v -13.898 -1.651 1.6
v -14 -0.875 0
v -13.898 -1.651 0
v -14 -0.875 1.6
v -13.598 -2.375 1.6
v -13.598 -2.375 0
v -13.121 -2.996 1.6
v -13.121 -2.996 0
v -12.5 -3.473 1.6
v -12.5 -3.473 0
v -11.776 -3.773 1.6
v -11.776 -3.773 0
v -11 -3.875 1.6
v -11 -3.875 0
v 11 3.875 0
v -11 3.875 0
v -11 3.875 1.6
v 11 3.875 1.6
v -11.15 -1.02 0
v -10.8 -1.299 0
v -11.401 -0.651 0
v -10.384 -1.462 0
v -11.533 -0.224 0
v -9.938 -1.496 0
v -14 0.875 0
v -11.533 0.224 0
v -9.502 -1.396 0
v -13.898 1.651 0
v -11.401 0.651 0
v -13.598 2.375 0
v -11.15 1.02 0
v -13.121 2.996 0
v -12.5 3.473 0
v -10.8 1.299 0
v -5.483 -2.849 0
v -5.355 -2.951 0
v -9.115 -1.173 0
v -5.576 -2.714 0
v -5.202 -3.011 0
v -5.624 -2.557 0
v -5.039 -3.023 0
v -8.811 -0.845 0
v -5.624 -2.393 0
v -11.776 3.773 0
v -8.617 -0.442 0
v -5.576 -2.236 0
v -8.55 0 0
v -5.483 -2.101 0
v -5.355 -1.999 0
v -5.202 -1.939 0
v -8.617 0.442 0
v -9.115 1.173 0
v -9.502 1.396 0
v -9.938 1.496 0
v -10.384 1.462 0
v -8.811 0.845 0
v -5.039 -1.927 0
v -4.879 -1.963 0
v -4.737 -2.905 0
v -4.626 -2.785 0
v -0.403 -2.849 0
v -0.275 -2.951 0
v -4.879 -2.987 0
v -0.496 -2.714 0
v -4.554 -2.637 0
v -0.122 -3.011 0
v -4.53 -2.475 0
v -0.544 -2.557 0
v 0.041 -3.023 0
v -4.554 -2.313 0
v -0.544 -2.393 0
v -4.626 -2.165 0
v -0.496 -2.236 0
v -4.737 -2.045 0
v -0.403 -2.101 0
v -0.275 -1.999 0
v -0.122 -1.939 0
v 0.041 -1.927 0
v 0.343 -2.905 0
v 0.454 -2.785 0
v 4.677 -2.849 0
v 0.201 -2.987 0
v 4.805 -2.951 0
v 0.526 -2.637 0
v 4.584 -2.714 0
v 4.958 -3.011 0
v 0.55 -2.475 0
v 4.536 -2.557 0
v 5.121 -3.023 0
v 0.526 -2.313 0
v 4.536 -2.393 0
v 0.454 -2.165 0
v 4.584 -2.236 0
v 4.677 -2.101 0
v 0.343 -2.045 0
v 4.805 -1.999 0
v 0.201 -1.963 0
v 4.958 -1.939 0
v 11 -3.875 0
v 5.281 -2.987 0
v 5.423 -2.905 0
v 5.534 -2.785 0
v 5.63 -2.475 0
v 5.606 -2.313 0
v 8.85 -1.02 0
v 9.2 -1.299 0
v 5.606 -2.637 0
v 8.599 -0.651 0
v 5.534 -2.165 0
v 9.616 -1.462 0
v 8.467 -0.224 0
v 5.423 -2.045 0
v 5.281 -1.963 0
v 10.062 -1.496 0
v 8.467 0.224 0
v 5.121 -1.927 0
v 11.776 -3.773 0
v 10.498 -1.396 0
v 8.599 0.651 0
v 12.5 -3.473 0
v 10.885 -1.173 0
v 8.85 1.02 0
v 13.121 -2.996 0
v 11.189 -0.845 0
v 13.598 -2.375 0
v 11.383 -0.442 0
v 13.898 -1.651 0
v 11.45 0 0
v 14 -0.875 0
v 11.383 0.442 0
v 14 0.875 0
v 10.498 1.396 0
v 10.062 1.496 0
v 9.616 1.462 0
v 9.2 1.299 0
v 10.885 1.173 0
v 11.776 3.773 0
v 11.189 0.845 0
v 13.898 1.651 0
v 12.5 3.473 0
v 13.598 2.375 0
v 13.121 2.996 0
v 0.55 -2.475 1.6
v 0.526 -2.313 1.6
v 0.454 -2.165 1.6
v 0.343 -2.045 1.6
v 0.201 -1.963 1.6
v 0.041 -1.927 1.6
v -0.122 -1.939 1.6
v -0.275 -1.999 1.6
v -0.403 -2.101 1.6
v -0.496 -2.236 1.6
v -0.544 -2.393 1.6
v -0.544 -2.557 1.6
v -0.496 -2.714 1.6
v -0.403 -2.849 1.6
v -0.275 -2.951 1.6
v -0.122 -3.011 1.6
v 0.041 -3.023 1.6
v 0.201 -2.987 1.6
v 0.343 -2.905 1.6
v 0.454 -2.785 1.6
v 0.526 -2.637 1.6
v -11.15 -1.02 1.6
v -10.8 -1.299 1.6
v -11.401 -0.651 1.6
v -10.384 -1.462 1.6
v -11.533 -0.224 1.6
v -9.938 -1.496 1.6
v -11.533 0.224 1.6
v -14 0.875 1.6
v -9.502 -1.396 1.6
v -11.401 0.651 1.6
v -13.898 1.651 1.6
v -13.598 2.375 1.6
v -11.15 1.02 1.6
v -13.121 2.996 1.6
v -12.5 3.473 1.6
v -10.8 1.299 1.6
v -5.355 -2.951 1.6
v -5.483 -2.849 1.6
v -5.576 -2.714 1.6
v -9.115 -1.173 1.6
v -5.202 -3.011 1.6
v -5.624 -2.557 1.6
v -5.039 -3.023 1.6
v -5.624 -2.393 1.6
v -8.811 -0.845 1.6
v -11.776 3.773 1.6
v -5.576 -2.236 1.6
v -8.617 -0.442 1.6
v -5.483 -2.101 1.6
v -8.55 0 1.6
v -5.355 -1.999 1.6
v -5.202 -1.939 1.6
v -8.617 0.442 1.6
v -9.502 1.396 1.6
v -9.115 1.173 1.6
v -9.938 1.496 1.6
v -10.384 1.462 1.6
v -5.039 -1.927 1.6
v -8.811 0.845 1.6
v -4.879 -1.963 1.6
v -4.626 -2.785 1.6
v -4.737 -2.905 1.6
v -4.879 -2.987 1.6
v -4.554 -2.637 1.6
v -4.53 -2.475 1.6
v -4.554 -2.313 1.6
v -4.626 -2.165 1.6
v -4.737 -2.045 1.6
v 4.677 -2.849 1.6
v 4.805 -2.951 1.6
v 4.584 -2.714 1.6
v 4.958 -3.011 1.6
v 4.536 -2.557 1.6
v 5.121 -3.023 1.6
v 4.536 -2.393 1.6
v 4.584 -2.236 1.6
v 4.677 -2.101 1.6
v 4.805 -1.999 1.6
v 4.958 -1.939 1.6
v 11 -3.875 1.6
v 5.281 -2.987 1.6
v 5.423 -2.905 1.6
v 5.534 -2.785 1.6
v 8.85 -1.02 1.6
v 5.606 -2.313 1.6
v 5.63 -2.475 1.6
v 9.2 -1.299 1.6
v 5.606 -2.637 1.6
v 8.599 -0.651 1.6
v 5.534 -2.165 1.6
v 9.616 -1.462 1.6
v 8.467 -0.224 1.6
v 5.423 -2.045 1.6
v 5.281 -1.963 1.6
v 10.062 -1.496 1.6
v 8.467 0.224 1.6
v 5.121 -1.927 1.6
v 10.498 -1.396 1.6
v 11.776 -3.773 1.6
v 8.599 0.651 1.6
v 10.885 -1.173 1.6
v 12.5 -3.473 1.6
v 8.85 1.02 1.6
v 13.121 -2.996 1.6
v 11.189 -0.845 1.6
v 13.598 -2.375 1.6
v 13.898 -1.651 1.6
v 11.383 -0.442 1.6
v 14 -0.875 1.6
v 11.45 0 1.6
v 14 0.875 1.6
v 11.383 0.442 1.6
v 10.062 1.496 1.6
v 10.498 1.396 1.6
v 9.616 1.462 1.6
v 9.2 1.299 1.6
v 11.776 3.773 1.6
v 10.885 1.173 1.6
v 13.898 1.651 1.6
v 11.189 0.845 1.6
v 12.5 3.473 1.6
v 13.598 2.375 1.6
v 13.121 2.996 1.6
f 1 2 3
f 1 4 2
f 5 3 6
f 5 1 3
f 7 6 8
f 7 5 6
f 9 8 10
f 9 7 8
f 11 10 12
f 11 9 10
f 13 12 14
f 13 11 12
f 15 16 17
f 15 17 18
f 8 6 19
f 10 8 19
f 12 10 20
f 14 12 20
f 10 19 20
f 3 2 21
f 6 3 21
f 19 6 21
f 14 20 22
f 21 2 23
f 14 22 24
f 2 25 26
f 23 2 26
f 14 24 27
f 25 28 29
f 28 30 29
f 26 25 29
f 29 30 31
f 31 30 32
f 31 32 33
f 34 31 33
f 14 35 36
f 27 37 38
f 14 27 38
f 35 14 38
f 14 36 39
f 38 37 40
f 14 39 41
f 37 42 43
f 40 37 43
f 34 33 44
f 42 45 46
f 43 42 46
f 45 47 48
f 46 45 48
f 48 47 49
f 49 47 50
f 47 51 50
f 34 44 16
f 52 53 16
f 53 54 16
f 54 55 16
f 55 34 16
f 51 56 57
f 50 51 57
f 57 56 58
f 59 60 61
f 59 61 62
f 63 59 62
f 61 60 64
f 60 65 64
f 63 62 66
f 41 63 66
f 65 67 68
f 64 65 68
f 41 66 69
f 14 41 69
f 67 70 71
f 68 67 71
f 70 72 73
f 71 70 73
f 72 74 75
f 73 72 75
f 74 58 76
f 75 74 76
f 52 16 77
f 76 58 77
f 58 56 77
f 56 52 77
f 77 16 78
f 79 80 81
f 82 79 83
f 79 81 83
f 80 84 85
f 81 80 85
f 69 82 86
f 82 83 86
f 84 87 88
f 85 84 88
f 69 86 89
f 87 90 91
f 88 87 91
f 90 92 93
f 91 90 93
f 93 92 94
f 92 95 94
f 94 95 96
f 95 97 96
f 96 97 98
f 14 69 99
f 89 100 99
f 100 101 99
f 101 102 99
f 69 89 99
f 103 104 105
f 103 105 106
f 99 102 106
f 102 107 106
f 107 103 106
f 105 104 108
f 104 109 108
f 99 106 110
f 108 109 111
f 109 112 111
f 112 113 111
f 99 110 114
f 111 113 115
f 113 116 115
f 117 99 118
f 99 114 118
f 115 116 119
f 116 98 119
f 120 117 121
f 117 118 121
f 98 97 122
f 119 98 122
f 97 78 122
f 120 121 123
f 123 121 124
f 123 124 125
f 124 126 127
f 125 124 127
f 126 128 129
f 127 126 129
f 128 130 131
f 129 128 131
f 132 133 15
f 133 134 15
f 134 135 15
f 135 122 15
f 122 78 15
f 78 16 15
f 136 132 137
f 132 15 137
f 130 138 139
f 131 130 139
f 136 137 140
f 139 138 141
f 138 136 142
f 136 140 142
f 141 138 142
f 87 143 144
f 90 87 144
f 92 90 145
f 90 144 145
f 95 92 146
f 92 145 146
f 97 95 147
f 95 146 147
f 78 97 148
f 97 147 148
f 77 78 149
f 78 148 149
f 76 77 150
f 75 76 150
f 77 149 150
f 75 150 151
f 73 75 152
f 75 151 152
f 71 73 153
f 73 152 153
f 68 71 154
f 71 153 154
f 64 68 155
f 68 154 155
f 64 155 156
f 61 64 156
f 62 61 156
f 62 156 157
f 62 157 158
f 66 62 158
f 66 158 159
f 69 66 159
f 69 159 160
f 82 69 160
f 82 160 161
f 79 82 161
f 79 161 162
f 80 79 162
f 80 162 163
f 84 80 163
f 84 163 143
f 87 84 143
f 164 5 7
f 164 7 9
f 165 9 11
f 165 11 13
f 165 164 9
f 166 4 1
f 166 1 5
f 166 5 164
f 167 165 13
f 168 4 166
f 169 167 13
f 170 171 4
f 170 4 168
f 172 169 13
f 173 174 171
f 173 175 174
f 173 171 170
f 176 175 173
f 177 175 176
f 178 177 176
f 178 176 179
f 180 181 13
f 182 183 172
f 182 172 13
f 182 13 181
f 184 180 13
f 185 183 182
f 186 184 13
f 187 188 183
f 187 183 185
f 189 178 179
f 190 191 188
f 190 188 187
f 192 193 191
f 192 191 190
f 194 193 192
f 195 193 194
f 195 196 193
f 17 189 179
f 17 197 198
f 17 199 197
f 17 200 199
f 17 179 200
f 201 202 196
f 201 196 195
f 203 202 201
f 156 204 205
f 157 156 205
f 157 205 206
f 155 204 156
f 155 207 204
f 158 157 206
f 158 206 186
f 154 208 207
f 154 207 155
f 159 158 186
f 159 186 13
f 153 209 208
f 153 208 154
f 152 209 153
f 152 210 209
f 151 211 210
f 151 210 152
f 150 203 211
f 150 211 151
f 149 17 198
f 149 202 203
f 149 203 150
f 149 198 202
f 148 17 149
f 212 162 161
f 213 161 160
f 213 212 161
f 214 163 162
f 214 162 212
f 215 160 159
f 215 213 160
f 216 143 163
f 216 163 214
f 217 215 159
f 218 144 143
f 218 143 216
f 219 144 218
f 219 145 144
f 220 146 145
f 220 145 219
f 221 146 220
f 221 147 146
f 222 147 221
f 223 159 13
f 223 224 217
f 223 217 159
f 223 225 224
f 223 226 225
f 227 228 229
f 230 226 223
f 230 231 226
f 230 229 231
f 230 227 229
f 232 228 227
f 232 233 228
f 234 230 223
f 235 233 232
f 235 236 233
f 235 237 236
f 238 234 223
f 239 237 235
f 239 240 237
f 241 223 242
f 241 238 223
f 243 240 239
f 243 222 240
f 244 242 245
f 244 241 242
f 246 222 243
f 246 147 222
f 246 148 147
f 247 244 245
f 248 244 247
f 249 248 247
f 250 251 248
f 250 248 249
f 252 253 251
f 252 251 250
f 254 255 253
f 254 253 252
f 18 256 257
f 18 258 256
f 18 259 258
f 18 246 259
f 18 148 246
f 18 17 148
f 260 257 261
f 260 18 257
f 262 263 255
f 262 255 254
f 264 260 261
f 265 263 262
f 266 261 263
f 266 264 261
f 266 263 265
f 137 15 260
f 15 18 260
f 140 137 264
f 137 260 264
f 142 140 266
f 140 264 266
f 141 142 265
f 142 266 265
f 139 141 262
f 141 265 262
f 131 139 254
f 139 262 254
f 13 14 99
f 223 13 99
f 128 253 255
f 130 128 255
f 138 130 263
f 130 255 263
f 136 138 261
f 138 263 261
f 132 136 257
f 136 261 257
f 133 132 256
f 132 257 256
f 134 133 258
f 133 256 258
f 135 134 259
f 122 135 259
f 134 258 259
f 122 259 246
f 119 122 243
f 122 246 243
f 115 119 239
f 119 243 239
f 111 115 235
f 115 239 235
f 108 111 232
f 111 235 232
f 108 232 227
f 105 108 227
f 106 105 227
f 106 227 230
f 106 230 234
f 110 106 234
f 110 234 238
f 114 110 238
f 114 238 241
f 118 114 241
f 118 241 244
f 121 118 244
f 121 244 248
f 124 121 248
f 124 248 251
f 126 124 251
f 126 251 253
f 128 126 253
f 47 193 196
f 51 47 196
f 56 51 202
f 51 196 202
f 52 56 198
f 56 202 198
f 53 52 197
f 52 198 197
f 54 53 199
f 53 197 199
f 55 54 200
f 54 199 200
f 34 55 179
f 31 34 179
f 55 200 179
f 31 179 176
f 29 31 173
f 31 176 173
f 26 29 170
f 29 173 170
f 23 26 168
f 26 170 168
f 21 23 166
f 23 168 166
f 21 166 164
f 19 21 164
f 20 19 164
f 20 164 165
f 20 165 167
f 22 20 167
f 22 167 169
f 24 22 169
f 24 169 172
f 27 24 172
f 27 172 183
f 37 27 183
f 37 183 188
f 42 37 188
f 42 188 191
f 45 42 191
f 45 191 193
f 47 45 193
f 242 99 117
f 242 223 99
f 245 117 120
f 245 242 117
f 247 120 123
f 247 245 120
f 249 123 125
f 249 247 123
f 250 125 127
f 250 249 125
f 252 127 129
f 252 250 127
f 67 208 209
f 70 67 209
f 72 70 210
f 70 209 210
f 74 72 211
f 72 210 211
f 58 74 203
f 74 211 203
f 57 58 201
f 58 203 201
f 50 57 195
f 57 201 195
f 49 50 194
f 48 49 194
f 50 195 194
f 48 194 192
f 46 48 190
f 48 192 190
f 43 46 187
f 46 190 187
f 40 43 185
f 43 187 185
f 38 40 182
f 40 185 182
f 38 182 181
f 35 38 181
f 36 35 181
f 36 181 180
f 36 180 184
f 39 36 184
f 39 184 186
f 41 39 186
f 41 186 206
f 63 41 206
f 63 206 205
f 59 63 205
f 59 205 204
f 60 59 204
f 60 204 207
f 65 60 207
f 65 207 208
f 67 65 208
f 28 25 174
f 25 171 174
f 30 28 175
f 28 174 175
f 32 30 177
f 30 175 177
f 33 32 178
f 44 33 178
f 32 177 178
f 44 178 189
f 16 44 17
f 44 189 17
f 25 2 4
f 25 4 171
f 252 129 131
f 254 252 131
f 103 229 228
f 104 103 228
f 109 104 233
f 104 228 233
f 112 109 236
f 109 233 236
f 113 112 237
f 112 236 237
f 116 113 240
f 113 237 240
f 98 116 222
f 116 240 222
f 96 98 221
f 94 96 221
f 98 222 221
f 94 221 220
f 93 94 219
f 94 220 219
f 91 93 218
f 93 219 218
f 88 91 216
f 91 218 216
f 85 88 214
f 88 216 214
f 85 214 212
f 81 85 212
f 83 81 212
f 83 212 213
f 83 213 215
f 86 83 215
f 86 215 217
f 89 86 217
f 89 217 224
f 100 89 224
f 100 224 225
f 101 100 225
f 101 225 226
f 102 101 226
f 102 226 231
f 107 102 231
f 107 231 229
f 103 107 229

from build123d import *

# Parameters (mm, degrees)
SKETCH1_W           = 28
SKETCH1_H           = 7.75
BOSS_EXTRUDE1_DEPTH = 1.6
SKETCH2_R           = 1.5
CUT_EXTRUDE1_DEPTH  = 2.6
SKETCH3_R           = 0.55
CUT_EXTRUDE2_DEPTH  = 2.6
FILLET1_R           = 3


with BuildPart() as part:
    # Sketch1 → Boss-Extrude1 (new body)
    with BuildSketch(Plane.XY):
        Rectangle(SKETCH1_W, SKETCH1_H)
    extrude(amount=BOSS_EXTRUDE1_DEPTH)

    # Sketch2 → Cut-Extrude1 (cut, through all)
    with BuildSketch(Plane.XY.offset(1.6)):
        with Locations((-10.05, 0)):
            Circle(SKETCH2_R)
        with Locations((9.95, 0)):
            Circle(SKETCH2_R)
    extrude(amount=-CUT_EXTRUDE1_DEPTH, mode=Mode.SUBTRACT)

    # Sketch3 → Cut-Extrude2 (cut, through all)
    with BuildSketch(Plane.XY.offset(1.6)):
        with Locations((0, -2.475)):
            Circle(SKETCH3_R)
        with Locations((-5.08, -2.475)):
            Circle(SKETCH3_R)
        with Locations((5.08, -2.475)):
            Circle(SKETCH3_R)
    extrude(amount=-CUT_EXTRUDE2_DEPTH, mode=Mode.SUBTRACT)

    # Fillet1
    fillet1_edges = [part.edges().sort_by_distance(p)[0] for p in [
        (14, -3.875, 0.8),
        (-14, -3.875, 0.8),
        (-14, 3.875, 0.8),
        (14, 3.875, 0.8),
    ]]
    fillet(fillet1_edges, radius=FILLET1_R)


solid = part.part
